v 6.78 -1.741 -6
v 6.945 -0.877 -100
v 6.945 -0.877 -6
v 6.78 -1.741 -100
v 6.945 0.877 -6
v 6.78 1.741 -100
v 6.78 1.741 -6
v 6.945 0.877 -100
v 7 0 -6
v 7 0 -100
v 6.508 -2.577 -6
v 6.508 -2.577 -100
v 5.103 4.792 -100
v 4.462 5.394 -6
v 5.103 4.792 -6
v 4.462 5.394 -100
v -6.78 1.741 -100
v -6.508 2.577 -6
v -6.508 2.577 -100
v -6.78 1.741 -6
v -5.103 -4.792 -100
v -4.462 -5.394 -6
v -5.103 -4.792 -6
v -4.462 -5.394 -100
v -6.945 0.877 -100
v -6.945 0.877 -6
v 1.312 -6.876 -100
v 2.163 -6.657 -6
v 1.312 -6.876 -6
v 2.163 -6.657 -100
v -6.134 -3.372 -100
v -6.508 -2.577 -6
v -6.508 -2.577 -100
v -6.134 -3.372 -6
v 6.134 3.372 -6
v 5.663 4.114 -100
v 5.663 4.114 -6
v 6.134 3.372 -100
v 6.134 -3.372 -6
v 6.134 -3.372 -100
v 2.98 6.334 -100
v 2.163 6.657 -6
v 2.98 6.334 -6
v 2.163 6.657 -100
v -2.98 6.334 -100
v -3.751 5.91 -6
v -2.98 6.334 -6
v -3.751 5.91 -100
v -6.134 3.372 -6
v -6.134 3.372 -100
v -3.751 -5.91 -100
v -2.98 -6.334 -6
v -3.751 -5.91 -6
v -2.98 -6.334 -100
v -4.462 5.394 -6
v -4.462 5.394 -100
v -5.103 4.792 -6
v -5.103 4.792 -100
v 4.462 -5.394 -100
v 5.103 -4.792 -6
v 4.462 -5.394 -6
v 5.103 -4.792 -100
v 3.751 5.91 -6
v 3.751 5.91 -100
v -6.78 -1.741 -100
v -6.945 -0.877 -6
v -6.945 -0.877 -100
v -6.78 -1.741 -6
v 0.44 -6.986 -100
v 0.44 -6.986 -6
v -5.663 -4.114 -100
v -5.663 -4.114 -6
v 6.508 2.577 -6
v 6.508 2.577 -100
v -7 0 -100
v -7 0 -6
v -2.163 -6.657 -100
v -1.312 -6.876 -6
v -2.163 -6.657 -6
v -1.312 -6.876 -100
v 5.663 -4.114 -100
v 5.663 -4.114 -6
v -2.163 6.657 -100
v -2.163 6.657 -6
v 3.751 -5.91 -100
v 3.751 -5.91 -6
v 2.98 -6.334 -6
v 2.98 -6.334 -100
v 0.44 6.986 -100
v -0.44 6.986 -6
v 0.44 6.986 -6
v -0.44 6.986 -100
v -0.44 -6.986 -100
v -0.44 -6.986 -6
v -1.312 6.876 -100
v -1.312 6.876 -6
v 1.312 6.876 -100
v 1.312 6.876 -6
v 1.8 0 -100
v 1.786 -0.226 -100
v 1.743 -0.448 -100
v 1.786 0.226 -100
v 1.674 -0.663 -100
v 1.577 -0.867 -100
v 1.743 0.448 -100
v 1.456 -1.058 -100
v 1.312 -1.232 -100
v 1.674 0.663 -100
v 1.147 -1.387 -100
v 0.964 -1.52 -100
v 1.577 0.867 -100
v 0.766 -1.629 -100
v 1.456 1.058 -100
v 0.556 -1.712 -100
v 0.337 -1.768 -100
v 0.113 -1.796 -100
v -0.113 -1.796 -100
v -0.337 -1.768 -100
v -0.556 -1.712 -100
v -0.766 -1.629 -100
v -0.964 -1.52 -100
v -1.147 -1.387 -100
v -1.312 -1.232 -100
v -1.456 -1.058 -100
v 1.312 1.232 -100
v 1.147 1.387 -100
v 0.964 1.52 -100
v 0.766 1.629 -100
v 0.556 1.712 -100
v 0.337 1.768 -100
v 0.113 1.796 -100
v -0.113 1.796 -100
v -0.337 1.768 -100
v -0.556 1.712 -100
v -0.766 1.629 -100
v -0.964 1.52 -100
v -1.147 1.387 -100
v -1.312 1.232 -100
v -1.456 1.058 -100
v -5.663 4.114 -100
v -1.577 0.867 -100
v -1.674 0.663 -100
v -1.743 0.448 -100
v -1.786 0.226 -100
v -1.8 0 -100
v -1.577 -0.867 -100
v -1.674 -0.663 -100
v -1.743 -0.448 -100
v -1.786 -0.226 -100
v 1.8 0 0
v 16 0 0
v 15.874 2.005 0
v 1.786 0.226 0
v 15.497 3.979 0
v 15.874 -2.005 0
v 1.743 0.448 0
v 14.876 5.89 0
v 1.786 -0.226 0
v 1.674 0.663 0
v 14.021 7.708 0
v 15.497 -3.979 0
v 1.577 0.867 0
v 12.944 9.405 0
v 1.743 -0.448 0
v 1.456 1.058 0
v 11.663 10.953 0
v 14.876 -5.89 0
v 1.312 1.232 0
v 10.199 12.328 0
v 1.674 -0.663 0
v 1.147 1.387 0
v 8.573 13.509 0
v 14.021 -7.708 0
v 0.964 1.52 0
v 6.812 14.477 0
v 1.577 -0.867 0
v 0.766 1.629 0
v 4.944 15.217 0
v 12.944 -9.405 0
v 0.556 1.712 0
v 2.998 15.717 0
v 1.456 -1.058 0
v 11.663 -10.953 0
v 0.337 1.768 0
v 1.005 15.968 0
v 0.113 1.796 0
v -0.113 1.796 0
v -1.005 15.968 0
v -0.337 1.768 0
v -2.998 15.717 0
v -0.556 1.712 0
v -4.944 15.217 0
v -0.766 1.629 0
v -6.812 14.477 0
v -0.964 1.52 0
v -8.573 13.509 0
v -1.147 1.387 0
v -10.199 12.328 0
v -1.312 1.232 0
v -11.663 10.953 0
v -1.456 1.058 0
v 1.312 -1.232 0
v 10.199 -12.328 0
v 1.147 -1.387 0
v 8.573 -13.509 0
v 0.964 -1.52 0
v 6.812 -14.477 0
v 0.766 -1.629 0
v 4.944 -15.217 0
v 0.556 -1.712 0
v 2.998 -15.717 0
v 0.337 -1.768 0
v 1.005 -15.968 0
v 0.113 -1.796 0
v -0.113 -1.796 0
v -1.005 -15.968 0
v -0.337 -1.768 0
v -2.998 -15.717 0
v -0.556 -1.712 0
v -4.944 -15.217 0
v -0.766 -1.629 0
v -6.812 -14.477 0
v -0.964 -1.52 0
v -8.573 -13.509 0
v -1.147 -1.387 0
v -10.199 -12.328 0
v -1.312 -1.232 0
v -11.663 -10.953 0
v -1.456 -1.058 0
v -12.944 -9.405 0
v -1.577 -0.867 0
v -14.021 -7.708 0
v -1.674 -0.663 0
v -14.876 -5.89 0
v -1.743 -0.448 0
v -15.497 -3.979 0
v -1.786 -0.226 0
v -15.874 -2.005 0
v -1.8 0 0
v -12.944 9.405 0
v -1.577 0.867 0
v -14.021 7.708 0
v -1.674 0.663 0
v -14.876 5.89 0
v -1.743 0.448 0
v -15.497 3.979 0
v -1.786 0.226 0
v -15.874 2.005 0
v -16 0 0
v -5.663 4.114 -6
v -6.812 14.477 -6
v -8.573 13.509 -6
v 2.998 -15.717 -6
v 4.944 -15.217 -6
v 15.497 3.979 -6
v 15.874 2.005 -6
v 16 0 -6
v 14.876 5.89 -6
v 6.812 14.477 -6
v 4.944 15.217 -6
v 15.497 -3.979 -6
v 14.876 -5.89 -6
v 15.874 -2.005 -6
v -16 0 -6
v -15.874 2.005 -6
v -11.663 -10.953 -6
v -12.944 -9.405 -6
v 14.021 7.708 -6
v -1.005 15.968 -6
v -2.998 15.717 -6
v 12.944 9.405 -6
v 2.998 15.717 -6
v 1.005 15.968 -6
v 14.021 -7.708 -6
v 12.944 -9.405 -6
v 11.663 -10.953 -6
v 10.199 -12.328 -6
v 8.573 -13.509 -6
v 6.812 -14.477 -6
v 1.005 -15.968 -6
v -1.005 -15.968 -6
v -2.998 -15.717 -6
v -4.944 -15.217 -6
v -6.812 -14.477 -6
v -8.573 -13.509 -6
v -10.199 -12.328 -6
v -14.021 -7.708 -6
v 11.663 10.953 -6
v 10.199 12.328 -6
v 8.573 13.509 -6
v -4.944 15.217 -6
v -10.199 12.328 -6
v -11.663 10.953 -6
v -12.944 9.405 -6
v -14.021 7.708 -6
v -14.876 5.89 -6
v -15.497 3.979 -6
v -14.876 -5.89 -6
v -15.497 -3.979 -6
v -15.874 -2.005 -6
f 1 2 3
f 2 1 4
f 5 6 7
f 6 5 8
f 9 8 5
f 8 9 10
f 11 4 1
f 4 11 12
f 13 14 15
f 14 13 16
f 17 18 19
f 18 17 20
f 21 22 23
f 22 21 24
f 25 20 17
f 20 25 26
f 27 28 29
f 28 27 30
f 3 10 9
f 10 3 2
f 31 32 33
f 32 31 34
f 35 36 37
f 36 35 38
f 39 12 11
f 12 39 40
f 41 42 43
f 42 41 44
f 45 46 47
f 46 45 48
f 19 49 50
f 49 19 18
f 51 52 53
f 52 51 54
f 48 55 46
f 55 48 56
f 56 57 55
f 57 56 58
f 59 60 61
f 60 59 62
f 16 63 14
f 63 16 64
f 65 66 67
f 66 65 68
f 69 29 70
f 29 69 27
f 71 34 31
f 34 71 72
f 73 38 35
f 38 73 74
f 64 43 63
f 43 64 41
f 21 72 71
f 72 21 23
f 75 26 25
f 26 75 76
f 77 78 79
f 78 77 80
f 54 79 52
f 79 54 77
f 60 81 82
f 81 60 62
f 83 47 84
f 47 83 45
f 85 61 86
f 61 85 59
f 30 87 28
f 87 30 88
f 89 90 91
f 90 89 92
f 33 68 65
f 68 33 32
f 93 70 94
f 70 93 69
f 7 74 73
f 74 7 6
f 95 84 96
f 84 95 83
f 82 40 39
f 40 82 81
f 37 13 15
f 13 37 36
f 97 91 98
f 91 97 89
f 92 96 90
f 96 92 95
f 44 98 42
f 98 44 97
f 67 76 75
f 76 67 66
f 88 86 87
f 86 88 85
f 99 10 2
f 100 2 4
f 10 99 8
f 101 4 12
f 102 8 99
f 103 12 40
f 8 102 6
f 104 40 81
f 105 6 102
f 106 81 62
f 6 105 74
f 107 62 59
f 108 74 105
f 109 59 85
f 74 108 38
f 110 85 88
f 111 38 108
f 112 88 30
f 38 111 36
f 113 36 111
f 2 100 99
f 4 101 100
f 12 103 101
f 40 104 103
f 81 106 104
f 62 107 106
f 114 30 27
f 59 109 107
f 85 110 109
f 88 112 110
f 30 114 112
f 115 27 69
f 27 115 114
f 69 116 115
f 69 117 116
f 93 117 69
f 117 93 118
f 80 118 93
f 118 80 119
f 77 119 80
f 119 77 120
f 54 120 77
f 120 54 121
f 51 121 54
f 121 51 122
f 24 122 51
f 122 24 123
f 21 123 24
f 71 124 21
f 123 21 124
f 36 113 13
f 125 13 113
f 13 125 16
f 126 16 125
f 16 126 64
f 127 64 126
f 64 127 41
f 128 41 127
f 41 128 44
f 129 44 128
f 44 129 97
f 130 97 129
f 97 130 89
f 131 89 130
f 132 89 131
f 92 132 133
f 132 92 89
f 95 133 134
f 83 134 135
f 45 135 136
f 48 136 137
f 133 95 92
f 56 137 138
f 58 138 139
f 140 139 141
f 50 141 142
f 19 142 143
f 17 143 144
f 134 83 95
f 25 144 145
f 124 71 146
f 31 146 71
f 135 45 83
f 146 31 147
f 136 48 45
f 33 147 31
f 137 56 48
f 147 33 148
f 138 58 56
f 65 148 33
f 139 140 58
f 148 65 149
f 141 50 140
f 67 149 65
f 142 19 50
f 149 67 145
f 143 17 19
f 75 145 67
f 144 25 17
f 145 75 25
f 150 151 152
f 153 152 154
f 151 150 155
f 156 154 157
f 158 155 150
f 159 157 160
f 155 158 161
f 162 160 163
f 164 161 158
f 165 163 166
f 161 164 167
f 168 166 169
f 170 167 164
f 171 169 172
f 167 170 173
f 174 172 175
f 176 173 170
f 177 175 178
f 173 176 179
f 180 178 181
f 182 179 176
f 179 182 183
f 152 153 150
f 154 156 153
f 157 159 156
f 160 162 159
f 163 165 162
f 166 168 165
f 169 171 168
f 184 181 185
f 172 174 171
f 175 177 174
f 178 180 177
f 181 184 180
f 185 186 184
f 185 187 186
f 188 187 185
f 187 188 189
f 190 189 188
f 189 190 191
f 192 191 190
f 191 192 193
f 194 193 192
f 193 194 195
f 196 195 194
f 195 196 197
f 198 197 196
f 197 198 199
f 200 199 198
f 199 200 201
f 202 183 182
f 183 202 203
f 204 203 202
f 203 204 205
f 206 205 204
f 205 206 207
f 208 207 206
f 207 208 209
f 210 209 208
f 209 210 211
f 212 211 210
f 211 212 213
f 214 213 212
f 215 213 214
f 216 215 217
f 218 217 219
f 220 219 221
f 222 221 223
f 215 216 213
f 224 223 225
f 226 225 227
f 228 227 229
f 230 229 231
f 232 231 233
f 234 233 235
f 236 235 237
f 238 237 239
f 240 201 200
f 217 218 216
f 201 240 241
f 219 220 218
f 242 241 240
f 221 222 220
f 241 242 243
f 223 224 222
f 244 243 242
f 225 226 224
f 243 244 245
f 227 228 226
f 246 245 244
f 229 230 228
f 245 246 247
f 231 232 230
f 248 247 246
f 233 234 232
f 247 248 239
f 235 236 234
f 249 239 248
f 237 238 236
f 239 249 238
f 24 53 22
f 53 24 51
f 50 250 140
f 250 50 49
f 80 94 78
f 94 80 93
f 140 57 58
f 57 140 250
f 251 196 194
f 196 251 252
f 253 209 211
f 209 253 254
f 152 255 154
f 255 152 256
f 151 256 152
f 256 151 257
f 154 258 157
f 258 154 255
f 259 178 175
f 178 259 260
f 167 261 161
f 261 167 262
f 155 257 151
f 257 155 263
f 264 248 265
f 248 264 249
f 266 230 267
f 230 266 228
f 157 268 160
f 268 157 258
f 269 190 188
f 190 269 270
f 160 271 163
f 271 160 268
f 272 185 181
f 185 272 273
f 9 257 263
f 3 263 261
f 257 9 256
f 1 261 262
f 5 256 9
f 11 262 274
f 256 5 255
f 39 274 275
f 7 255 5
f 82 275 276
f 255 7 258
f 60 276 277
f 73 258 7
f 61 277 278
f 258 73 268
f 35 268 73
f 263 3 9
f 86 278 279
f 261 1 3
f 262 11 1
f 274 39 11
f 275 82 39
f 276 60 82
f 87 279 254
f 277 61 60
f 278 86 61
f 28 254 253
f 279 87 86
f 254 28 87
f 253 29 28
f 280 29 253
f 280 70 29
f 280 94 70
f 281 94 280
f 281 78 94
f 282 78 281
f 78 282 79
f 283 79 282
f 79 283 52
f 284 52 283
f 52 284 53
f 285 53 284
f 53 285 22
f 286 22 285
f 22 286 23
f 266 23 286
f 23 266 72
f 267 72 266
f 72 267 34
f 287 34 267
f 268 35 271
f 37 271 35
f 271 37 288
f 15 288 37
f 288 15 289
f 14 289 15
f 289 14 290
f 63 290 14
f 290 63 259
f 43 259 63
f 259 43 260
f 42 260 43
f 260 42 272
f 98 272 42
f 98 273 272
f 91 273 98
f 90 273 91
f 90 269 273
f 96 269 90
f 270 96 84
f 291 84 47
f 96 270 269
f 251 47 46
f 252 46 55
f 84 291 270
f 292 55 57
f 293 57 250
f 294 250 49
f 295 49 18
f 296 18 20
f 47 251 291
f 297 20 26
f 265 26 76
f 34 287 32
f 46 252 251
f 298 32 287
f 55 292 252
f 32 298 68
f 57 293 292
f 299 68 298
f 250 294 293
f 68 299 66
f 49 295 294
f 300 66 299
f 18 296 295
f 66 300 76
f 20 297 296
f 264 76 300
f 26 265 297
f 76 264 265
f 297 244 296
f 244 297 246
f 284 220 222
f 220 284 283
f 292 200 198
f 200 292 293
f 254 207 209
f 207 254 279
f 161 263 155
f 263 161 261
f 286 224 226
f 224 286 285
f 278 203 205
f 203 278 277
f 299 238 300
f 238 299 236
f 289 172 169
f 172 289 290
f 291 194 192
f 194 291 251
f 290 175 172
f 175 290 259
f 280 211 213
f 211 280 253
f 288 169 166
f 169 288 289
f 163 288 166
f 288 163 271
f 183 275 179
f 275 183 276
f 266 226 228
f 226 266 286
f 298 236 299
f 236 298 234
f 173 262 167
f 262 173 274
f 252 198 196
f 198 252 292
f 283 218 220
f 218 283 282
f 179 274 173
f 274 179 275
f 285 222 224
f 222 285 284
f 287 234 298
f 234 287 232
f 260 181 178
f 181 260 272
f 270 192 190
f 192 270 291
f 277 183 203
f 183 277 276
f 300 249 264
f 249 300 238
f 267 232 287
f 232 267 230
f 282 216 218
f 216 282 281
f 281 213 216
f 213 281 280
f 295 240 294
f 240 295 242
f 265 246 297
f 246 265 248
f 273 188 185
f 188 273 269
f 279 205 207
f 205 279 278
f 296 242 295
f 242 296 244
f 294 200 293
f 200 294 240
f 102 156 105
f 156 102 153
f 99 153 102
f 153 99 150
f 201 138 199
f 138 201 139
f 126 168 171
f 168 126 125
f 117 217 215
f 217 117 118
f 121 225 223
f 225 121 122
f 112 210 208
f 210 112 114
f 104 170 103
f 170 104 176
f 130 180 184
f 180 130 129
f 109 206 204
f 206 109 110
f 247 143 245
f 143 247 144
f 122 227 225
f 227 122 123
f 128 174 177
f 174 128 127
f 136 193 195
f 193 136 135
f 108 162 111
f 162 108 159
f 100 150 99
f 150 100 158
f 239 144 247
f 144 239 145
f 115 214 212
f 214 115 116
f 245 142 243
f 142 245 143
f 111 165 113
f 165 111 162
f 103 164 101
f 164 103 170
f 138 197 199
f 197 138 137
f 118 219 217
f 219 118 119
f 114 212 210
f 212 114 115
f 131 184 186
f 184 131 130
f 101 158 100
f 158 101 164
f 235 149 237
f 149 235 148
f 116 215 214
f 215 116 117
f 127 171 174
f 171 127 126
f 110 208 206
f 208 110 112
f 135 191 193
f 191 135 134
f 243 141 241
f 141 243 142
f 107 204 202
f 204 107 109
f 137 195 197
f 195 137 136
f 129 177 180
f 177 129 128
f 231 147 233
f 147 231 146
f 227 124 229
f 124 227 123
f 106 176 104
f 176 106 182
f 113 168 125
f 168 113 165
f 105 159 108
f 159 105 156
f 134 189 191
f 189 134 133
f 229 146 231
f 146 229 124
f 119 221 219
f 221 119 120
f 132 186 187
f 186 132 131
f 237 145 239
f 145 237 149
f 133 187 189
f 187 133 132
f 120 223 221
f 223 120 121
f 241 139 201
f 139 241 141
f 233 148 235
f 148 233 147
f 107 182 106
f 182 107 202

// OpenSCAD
$fn = 50;


difference() {
	union() {
		translate(v = [0, 0, -100.0000000000]) {
			cylinder(h = 100, r = 7.0000000000);
		}
		translate(v = [0, 0, -6.0000000000]) {
			cylinder(h = 6, r = 16.0000000000);
		}
	}
	union() {
		#translate(v = [0, 0, -100]) {
			cylinder(h = 100, r = 1.8000000000);
		}
	}
}
